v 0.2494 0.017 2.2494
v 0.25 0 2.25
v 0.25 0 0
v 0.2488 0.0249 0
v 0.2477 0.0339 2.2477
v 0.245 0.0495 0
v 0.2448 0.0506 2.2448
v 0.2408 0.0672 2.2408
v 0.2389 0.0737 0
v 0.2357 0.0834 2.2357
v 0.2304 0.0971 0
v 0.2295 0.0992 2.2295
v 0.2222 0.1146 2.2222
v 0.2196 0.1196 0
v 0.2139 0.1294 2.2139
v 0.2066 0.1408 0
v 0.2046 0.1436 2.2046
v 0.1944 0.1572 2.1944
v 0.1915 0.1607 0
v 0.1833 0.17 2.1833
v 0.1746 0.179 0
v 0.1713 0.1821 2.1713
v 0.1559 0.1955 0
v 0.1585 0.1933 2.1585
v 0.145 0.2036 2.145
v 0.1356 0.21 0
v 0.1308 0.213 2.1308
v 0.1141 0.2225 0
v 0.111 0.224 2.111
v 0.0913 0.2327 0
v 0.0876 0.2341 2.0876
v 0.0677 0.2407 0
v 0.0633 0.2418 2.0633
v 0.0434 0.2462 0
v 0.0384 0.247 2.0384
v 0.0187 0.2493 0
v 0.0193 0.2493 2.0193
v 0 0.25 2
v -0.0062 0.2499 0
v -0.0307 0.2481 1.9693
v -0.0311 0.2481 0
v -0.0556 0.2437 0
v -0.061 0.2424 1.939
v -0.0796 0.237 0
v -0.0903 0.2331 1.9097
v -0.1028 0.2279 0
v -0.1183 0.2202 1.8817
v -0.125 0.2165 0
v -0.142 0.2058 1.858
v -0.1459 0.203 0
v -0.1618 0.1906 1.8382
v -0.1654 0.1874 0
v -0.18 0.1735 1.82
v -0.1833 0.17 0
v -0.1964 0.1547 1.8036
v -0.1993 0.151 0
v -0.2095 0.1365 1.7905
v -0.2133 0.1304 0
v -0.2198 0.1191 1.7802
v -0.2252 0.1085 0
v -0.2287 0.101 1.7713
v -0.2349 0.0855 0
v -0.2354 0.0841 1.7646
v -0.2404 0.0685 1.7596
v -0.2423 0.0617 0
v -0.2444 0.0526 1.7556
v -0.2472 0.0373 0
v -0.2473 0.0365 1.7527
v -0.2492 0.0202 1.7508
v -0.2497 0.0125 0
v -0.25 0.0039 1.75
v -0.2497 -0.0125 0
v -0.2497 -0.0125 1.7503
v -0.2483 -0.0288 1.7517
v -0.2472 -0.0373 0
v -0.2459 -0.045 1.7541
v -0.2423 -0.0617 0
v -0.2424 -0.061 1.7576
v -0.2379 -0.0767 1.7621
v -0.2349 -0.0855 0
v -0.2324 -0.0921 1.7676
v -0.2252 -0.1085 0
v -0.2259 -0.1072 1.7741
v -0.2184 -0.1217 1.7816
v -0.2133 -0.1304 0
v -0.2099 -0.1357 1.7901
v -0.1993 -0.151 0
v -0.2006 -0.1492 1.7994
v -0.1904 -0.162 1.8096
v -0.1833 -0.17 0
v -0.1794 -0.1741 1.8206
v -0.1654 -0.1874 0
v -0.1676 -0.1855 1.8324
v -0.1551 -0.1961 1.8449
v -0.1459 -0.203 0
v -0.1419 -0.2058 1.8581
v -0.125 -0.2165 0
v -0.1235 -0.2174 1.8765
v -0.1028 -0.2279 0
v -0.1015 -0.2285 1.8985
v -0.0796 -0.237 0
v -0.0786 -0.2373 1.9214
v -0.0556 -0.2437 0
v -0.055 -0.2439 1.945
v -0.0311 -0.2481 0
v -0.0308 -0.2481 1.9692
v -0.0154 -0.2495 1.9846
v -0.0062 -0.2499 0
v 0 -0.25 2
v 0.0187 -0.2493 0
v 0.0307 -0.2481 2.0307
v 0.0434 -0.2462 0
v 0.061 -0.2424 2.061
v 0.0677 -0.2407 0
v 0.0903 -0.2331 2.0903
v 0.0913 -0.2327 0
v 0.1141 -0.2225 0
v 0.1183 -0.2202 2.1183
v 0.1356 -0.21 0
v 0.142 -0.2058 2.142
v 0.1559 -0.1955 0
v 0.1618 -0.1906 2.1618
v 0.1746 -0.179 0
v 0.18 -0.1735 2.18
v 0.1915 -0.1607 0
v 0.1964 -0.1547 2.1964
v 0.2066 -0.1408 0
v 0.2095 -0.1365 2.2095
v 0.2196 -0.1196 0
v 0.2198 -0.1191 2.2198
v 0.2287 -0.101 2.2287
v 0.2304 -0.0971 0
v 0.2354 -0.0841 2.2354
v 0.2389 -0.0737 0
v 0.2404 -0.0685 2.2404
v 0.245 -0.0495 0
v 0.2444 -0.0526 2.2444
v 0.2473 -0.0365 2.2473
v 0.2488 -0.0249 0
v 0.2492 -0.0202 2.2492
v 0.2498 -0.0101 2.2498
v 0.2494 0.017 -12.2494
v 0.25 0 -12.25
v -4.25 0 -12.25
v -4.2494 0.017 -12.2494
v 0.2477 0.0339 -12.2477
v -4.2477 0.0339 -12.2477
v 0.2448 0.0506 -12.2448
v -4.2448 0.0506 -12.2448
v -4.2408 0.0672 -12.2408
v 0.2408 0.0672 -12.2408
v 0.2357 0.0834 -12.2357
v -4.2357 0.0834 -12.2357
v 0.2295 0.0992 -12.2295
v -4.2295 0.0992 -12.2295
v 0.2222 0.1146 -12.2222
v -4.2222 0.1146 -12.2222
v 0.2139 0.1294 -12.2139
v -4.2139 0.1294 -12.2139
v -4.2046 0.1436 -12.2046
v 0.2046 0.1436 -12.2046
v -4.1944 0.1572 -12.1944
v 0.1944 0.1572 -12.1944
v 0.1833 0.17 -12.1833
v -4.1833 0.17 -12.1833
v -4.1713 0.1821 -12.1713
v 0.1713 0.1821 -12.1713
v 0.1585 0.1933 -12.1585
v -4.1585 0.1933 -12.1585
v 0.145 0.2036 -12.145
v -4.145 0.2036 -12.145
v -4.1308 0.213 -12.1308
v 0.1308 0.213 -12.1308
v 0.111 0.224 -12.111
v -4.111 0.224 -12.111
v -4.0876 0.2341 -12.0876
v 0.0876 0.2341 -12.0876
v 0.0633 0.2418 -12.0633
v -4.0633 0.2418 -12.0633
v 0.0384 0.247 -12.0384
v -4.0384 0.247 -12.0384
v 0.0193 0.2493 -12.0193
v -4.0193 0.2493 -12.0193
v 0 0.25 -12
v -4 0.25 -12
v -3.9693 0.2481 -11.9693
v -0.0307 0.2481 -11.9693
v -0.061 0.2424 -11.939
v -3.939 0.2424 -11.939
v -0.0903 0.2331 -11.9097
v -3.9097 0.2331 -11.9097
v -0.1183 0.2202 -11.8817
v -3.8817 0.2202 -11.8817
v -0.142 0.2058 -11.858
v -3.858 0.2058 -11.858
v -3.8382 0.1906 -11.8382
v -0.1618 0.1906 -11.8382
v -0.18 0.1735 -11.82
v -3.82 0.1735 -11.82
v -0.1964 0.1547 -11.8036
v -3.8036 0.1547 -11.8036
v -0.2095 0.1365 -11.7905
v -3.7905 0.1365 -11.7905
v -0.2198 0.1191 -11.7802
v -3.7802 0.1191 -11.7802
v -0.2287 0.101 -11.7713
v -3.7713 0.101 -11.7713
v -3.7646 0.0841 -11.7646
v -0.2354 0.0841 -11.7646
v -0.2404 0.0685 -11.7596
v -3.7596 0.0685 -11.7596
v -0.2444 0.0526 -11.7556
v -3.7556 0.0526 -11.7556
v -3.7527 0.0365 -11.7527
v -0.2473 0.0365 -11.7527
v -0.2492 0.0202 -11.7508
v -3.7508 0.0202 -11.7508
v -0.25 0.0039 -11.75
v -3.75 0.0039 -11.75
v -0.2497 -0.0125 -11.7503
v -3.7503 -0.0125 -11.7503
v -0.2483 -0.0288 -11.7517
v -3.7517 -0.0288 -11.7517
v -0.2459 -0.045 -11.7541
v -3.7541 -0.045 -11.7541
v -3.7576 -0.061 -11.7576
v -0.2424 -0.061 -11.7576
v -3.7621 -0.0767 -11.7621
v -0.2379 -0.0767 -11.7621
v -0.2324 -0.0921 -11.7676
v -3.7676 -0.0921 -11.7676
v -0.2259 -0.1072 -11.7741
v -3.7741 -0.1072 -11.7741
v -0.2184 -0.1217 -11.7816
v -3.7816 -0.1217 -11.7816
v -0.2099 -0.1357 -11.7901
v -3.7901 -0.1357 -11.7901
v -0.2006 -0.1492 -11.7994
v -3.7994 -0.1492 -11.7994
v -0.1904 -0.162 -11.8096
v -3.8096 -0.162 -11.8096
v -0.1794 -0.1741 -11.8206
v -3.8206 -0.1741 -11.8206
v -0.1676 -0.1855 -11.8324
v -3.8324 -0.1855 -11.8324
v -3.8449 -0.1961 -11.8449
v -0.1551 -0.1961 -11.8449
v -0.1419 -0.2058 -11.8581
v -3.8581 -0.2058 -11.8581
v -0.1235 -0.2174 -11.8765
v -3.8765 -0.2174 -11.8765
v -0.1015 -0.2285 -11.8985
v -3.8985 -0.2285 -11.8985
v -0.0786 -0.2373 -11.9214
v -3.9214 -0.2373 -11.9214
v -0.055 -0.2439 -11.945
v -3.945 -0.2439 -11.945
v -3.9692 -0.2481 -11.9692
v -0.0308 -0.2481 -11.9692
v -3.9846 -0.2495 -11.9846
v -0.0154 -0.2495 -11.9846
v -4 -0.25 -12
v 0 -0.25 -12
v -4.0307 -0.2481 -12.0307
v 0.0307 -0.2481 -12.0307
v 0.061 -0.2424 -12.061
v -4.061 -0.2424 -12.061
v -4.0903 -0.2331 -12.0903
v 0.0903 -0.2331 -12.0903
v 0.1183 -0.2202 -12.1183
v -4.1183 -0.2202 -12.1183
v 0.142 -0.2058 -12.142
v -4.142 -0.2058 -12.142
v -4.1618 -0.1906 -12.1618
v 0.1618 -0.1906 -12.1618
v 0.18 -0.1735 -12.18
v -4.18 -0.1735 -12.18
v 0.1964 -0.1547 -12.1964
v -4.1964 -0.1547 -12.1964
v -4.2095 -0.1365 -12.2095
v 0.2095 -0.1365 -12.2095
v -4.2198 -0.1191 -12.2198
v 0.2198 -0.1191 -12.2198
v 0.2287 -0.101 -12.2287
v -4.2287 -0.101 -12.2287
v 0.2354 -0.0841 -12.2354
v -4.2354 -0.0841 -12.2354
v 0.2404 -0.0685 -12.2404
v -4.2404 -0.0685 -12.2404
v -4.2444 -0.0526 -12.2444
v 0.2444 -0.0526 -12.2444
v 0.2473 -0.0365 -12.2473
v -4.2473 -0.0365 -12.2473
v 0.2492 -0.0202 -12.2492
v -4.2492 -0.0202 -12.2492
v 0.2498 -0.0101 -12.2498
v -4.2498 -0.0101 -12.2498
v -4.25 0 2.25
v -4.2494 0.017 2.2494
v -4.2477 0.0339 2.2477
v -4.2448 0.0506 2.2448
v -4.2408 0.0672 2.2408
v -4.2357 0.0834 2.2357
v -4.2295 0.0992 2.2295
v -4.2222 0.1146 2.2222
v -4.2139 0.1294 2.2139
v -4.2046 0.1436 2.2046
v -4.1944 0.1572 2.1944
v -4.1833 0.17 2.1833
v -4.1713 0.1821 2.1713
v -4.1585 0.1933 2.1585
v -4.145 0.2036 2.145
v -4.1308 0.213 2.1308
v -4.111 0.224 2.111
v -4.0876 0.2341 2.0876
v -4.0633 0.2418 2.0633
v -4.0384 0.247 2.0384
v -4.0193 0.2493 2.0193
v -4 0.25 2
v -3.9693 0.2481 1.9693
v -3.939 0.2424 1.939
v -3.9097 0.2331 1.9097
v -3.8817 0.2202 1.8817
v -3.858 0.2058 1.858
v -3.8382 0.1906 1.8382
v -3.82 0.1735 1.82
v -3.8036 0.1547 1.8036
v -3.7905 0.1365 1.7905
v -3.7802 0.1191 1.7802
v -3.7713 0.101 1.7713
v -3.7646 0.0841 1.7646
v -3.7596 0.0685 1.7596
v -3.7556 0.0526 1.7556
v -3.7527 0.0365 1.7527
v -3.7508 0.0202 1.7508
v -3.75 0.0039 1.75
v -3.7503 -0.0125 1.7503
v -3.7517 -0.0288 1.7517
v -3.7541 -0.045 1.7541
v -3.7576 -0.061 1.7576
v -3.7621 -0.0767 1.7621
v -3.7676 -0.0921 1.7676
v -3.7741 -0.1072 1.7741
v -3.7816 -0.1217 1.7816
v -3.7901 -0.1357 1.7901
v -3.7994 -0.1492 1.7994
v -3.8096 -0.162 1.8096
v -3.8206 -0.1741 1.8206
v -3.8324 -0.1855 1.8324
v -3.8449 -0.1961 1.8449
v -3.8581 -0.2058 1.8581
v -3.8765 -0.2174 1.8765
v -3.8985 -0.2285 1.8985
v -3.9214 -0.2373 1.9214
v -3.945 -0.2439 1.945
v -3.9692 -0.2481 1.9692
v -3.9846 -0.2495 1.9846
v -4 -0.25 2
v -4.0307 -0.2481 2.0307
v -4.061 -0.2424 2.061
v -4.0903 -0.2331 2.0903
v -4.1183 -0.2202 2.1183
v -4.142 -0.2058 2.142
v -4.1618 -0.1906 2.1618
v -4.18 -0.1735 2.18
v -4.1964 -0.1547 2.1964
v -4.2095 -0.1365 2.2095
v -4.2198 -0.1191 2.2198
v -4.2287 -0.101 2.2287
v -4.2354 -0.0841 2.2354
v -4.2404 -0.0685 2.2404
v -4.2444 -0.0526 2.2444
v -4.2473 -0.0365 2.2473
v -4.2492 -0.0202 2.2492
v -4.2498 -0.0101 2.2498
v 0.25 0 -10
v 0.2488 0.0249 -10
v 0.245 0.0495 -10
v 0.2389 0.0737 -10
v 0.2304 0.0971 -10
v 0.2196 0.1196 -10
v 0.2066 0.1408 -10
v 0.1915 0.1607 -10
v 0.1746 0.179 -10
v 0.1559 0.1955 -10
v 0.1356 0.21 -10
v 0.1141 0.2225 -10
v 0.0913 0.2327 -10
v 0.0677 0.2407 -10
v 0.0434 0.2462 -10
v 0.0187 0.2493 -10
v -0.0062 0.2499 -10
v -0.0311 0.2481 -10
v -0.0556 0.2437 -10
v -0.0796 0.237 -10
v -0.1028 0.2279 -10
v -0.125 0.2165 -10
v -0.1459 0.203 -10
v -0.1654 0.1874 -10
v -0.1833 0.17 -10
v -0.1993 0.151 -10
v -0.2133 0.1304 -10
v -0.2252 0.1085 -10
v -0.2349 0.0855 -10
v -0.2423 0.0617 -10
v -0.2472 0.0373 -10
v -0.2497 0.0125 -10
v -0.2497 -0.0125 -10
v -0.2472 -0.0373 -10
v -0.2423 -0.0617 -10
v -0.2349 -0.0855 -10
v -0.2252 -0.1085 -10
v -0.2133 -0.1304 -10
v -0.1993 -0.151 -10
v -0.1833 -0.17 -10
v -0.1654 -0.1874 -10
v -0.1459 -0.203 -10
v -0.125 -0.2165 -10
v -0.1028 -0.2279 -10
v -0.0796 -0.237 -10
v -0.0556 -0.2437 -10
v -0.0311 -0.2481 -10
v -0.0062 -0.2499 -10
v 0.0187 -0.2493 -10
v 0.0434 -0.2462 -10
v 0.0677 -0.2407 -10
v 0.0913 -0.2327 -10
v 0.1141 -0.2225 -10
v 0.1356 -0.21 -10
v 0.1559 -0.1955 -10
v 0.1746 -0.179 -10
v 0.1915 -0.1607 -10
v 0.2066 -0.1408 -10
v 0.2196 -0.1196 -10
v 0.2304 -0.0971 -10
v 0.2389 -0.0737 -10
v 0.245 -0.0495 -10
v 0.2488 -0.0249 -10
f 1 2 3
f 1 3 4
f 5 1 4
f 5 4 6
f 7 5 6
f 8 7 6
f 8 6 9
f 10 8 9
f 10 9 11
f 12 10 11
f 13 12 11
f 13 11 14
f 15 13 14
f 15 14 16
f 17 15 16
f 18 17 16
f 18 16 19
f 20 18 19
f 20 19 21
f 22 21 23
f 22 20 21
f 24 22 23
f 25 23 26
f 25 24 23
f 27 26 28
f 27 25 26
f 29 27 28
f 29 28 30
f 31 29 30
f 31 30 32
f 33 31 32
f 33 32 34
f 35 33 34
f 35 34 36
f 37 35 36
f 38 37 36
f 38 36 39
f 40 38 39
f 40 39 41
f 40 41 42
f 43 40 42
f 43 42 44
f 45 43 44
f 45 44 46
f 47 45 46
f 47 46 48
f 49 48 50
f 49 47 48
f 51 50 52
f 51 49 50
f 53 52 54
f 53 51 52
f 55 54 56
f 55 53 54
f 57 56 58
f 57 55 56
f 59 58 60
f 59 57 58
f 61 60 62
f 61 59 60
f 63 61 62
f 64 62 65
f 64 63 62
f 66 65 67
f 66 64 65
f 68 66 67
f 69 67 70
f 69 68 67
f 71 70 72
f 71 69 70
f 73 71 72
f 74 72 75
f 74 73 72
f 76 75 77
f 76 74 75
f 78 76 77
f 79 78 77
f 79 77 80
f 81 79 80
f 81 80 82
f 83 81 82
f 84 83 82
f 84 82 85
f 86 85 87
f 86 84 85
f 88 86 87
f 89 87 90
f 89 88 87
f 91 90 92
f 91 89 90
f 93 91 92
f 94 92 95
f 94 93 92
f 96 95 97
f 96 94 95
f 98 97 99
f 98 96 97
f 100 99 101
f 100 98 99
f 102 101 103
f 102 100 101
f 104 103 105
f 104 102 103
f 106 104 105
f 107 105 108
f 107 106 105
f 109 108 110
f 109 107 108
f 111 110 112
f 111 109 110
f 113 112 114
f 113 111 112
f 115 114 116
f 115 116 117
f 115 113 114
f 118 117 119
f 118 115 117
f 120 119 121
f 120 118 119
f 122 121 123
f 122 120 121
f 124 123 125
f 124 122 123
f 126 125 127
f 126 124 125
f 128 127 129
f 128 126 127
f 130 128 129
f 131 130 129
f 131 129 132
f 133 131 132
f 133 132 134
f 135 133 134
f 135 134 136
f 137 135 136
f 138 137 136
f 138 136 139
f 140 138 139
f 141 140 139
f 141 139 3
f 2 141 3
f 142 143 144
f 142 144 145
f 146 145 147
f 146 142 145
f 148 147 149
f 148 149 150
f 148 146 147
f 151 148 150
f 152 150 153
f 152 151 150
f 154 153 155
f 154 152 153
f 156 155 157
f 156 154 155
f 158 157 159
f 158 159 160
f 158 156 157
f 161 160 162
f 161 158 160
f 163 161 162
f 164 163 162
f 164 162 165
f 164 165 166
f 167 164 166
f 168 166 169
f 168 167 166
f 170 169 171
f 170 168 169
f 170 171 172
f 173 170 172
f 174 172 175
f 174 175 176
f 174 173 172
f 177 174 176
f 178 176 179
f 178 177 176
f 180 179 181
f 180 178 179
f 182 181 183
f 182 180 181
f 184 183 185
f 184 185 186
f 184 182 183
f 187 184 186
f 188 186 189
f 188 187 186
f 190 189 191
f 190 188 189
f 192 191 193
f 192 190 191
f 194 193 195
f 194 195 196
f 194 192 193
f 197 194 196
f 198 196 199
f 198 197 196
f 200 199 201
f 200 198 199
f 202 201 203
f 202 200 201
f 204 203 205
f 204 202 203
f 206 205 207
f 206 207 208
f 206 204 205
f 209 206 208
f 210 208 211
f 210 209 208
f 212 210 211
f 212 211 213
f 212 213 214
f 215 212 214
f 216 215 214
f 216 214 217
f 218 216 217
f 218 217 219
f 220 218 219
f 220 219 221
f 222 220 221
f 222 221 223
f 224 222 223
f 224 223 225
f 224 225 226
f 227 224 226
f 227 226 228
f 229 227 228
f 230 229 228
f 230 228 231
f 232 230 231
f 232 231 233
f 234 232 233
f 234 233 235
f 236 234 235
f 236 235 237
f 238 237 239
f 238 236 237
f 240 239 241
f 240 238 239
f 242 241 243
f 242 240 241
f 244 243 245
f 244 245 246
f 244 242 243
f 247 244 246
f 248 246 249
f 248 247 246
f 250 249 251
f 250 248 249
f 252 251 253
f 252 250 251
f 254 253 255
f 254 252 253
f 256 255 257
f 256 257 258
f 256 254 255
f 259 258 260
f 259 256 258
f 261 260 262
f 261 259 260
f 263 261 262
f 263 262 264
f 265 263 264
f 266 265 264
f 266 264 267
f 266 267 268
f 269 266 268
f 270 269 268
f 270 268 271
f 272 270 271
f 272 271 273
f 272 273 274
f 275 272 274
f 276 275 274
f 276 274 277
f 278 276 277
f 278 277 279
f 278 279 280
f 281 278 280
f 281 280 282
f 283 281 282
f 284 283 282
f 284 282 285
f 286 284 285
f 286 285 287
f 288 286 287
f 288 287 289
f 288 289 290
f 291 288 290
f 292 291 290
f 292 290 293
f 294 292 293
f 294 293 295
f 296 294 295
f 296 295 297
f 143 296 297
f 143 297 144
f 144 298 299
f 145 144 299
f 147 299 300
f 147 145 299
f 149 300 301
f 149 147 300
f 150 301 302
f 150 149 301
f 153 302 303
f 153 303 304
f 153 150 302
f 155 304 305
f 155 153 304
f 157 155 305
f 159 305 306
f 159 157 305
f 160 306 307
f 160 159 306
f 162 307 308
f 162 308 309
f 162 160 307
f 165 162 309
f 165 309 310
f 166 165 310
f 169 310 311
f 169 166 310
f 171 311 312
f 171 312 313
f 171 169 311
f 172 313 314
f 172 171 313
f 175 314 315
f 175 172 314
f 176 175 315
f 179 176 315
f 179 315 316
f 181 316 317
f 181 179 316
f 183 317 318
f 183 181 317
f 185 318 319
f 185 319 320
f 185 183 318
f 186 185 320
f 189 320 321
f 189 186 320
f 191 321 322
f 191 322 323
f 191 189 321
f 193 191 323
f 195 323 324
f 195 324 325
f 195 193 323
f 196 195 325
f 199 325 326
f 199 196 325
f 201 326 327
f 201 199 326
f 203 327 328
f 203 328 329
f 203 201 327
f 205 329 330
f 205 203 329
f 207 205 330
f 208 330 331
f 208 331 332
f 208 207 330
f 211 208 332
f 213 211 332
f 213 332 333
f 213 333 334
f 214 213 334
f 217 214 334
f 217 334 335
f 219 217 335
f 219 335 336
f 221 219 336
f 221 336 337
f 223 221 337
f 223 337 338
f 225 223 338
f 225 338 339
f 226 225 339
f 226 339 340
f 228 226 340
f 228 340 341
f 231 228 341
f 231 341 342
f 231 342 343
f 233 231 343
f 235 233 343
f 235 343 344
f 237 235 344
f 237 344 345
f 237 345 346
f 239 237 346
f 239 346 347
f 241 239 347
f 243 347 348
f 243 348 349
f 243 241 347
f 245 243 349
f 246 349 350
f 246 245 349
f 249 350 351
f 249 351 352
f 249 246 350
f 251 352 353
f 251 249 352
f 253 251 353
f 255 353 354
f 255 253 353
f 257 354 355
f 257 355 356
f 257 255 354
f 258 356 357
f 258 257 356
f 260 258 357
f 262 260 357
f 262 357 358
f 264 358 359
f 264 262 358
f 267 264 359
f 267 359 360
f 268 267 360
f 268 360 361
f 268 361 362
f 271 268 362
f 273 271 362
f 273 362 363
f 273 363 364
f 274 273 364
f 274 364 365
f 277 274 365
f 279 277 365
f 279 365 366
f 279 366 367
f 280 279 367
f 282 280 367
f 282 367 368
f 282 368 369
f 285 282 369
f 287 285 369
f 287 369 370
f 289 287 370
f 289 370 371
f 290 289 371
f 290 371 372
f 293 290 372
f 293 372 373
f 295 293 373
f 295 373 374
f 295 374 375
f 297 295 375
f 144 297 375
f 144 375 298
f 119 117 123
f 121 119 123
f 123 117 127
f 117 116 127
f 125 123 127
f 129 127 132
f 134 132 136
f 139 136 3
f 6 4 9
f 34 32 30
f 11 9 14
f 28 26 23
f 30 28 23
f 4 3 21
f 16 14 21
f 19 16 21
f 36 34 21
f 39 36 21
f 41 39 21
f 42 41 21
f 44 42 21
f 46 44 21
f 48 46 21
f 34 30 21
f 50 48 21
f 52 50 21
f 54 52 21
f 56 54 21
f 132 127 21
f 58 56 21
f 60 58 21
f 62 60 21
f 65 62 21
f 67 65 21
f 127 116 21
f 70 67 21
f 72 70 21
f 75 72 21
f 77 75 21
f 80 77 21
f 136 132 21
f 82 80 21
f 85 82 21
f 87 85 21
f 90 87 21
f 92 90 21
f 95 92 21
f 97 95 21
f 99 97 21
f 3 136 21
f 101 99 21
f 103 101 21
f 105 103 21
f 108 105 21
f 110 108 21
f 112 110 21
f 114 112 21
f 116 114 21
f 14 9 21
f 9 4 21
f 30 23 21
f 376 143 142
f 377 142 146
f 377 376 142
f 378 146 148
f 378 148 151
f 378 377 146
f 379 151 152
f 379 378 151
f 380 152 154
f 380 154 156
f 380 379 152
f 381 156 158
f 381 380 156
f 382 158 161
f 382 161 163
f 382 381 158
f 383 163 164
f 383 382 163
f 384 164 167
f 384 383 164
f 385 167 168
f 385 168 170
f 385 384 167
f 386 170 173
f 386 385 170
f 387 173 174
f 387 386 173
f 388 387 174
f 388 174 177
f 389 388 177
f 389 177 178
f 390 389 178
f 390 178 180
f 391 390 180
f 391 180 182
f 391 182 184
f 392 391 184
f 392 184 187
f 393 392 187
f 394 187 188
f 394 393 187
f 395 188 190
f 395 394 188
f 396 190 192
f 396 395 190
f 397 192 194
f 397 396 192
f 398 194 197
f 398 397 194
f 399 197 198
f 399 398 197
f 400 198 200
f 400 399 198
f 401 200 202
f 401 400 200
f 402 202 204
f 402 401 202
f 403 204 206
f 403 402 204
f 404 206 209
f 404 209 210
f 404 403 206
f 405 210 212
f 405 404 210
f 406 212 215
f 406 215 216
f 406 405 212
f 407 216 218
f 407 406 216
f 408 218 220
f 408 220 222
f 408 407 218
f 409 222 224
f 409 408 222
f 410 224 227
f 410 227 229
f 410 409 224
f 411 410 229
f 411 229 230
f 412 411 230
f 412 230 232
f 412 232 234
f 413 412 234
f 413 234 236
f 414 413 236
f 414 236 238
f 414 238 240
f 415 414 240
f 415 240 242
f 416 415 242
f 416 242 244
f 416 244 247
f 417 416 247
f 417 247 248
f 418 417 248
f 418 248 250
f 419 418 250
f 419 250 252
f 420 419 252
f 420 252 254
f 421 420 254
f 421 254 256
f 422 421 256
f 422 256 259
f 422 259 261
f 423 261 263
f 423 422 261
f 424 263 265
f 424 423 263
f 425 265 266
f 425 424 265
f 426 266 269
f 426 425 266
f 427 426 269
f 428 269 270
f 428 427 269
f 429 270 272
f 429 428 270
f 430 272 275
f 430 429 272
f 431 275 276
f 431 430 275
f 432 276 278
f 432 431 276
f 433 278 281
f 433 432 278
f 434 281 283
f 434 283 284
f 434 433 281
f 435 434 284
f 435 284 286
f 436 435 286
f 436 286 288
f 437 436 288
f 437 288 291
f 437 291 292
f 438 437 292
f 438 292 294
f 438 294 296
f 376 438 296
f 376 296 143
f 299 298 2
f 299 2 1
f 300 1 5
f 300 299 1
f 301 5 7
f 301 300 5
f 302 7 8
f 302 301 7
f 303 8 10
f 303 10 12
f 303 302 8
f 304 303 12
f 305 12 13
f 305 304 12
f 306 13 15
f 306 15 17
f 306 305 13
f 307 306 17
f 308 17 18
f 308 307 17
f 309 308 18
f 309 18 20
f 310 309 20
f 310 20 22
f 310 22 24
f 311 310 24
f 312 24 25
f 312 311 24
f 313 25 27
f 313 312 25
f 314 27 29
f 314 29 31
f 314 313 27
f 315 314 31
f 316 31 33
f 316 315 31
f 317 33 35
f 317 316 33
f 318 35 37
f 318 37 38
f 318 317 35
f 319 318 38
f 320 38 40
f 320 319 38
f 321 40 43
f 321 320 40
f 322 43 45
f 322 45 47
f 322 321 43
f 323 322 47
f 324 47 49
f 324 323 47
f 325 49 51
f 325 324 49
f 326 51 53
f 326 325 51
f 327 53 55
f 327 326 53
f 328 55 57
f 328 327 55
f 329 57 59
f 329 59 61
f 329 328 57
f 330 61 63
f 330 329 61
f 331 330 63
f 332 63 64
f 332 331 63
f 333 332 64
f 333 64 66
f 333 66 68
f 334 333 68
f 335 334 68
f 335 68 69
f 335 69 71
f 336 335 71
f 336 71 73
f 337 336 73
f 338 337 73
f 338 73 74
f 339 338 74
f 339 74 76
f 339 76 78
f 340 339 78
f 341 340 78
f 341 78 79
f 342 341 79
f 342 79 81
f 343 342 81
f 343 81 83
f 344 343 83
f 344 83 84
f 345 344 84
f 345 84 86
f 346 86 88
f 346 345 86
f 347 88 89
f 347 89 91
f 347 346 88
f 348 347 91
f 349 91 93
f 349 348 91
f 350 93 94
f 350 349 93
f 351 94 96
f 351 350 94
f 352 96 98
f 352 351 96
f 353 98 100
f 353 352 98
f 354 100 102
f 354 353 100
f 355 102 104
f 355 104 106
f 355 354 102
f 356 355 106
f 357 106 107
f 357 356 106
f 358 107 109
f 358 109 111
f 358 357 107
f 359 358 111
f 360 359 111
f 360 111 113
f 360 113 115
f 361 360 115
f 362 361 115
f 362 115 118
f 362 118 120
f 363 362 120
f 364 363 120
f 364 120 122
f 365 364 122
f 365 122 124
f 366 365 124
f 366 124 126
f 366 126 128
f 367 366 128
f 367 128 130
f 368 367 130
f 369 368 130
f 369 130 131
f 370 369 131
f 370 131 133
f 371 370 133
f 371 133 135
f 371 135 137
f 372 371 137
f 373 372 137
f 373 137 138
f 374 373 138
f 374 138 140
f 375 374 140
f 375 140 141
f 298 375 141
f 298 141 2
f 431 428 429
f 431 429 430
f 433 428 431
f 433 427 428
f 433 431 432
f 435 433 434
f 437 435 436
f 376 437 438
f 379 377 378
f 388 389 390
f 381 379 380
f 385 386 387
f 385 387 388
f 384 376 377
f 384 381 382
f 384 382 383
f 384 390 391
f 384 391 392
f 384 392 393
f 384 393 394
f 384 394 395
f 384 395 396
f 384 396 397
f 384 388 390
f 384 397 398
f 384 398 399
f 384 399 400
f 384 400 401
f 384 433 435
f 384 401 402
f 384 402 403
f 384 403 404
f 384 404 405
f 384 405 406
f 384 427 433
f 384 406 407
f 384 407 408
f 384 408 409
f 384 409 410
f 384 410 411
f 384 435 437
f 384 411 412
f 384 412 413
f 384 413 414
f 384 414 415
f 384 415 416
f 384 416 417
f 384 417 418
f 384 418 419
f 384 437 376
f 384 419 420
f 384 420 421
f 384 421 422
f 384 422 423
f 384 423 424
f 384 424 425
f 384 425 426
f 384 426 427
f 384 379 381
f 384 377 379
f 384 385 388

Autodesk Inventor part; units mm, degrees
ref_plane "YZ Plane" through (0, 0, 0) normal (1, 0, 0) x (0, 1, 0)
ref_plane "XZ Plane" through (0, 0, 0) normal (0, 1, 0) x (-1, 0, 0)
ref_plane "XY Plane" through (0, 0, 0) normal (0, 0, 1) x (1, 0, 0)
sketch "Skizze1" plane through (0, 0, 0) normal (0, 0, 1) x (1, 0, 0)
  circle A0 centre (0, 0) radius 0.25
  dimension "d0" = 0.5
sketch "Skizze2" plane through (0, 0, 0) normal (0, 1, 0) x (-1, 0, 0)
  line L0 (0, 0) -> (0, 2)
  line L1 (0, 2) -> (4, 2)
  line L2 (4, 2) -> (4, -12)
  line L3 (4, -12) -> (0, -12)
  line L4 (0, -12) -> (0, -10)
  dimension "d1" = 2
  dimension "d2" = 4
  dimension "d3" = 14
  dimension "d4" = 2
sweep "Sweeping1" add profiles "Skizze1" path "Skizze2"
properties part number "Transition_3_Init"
